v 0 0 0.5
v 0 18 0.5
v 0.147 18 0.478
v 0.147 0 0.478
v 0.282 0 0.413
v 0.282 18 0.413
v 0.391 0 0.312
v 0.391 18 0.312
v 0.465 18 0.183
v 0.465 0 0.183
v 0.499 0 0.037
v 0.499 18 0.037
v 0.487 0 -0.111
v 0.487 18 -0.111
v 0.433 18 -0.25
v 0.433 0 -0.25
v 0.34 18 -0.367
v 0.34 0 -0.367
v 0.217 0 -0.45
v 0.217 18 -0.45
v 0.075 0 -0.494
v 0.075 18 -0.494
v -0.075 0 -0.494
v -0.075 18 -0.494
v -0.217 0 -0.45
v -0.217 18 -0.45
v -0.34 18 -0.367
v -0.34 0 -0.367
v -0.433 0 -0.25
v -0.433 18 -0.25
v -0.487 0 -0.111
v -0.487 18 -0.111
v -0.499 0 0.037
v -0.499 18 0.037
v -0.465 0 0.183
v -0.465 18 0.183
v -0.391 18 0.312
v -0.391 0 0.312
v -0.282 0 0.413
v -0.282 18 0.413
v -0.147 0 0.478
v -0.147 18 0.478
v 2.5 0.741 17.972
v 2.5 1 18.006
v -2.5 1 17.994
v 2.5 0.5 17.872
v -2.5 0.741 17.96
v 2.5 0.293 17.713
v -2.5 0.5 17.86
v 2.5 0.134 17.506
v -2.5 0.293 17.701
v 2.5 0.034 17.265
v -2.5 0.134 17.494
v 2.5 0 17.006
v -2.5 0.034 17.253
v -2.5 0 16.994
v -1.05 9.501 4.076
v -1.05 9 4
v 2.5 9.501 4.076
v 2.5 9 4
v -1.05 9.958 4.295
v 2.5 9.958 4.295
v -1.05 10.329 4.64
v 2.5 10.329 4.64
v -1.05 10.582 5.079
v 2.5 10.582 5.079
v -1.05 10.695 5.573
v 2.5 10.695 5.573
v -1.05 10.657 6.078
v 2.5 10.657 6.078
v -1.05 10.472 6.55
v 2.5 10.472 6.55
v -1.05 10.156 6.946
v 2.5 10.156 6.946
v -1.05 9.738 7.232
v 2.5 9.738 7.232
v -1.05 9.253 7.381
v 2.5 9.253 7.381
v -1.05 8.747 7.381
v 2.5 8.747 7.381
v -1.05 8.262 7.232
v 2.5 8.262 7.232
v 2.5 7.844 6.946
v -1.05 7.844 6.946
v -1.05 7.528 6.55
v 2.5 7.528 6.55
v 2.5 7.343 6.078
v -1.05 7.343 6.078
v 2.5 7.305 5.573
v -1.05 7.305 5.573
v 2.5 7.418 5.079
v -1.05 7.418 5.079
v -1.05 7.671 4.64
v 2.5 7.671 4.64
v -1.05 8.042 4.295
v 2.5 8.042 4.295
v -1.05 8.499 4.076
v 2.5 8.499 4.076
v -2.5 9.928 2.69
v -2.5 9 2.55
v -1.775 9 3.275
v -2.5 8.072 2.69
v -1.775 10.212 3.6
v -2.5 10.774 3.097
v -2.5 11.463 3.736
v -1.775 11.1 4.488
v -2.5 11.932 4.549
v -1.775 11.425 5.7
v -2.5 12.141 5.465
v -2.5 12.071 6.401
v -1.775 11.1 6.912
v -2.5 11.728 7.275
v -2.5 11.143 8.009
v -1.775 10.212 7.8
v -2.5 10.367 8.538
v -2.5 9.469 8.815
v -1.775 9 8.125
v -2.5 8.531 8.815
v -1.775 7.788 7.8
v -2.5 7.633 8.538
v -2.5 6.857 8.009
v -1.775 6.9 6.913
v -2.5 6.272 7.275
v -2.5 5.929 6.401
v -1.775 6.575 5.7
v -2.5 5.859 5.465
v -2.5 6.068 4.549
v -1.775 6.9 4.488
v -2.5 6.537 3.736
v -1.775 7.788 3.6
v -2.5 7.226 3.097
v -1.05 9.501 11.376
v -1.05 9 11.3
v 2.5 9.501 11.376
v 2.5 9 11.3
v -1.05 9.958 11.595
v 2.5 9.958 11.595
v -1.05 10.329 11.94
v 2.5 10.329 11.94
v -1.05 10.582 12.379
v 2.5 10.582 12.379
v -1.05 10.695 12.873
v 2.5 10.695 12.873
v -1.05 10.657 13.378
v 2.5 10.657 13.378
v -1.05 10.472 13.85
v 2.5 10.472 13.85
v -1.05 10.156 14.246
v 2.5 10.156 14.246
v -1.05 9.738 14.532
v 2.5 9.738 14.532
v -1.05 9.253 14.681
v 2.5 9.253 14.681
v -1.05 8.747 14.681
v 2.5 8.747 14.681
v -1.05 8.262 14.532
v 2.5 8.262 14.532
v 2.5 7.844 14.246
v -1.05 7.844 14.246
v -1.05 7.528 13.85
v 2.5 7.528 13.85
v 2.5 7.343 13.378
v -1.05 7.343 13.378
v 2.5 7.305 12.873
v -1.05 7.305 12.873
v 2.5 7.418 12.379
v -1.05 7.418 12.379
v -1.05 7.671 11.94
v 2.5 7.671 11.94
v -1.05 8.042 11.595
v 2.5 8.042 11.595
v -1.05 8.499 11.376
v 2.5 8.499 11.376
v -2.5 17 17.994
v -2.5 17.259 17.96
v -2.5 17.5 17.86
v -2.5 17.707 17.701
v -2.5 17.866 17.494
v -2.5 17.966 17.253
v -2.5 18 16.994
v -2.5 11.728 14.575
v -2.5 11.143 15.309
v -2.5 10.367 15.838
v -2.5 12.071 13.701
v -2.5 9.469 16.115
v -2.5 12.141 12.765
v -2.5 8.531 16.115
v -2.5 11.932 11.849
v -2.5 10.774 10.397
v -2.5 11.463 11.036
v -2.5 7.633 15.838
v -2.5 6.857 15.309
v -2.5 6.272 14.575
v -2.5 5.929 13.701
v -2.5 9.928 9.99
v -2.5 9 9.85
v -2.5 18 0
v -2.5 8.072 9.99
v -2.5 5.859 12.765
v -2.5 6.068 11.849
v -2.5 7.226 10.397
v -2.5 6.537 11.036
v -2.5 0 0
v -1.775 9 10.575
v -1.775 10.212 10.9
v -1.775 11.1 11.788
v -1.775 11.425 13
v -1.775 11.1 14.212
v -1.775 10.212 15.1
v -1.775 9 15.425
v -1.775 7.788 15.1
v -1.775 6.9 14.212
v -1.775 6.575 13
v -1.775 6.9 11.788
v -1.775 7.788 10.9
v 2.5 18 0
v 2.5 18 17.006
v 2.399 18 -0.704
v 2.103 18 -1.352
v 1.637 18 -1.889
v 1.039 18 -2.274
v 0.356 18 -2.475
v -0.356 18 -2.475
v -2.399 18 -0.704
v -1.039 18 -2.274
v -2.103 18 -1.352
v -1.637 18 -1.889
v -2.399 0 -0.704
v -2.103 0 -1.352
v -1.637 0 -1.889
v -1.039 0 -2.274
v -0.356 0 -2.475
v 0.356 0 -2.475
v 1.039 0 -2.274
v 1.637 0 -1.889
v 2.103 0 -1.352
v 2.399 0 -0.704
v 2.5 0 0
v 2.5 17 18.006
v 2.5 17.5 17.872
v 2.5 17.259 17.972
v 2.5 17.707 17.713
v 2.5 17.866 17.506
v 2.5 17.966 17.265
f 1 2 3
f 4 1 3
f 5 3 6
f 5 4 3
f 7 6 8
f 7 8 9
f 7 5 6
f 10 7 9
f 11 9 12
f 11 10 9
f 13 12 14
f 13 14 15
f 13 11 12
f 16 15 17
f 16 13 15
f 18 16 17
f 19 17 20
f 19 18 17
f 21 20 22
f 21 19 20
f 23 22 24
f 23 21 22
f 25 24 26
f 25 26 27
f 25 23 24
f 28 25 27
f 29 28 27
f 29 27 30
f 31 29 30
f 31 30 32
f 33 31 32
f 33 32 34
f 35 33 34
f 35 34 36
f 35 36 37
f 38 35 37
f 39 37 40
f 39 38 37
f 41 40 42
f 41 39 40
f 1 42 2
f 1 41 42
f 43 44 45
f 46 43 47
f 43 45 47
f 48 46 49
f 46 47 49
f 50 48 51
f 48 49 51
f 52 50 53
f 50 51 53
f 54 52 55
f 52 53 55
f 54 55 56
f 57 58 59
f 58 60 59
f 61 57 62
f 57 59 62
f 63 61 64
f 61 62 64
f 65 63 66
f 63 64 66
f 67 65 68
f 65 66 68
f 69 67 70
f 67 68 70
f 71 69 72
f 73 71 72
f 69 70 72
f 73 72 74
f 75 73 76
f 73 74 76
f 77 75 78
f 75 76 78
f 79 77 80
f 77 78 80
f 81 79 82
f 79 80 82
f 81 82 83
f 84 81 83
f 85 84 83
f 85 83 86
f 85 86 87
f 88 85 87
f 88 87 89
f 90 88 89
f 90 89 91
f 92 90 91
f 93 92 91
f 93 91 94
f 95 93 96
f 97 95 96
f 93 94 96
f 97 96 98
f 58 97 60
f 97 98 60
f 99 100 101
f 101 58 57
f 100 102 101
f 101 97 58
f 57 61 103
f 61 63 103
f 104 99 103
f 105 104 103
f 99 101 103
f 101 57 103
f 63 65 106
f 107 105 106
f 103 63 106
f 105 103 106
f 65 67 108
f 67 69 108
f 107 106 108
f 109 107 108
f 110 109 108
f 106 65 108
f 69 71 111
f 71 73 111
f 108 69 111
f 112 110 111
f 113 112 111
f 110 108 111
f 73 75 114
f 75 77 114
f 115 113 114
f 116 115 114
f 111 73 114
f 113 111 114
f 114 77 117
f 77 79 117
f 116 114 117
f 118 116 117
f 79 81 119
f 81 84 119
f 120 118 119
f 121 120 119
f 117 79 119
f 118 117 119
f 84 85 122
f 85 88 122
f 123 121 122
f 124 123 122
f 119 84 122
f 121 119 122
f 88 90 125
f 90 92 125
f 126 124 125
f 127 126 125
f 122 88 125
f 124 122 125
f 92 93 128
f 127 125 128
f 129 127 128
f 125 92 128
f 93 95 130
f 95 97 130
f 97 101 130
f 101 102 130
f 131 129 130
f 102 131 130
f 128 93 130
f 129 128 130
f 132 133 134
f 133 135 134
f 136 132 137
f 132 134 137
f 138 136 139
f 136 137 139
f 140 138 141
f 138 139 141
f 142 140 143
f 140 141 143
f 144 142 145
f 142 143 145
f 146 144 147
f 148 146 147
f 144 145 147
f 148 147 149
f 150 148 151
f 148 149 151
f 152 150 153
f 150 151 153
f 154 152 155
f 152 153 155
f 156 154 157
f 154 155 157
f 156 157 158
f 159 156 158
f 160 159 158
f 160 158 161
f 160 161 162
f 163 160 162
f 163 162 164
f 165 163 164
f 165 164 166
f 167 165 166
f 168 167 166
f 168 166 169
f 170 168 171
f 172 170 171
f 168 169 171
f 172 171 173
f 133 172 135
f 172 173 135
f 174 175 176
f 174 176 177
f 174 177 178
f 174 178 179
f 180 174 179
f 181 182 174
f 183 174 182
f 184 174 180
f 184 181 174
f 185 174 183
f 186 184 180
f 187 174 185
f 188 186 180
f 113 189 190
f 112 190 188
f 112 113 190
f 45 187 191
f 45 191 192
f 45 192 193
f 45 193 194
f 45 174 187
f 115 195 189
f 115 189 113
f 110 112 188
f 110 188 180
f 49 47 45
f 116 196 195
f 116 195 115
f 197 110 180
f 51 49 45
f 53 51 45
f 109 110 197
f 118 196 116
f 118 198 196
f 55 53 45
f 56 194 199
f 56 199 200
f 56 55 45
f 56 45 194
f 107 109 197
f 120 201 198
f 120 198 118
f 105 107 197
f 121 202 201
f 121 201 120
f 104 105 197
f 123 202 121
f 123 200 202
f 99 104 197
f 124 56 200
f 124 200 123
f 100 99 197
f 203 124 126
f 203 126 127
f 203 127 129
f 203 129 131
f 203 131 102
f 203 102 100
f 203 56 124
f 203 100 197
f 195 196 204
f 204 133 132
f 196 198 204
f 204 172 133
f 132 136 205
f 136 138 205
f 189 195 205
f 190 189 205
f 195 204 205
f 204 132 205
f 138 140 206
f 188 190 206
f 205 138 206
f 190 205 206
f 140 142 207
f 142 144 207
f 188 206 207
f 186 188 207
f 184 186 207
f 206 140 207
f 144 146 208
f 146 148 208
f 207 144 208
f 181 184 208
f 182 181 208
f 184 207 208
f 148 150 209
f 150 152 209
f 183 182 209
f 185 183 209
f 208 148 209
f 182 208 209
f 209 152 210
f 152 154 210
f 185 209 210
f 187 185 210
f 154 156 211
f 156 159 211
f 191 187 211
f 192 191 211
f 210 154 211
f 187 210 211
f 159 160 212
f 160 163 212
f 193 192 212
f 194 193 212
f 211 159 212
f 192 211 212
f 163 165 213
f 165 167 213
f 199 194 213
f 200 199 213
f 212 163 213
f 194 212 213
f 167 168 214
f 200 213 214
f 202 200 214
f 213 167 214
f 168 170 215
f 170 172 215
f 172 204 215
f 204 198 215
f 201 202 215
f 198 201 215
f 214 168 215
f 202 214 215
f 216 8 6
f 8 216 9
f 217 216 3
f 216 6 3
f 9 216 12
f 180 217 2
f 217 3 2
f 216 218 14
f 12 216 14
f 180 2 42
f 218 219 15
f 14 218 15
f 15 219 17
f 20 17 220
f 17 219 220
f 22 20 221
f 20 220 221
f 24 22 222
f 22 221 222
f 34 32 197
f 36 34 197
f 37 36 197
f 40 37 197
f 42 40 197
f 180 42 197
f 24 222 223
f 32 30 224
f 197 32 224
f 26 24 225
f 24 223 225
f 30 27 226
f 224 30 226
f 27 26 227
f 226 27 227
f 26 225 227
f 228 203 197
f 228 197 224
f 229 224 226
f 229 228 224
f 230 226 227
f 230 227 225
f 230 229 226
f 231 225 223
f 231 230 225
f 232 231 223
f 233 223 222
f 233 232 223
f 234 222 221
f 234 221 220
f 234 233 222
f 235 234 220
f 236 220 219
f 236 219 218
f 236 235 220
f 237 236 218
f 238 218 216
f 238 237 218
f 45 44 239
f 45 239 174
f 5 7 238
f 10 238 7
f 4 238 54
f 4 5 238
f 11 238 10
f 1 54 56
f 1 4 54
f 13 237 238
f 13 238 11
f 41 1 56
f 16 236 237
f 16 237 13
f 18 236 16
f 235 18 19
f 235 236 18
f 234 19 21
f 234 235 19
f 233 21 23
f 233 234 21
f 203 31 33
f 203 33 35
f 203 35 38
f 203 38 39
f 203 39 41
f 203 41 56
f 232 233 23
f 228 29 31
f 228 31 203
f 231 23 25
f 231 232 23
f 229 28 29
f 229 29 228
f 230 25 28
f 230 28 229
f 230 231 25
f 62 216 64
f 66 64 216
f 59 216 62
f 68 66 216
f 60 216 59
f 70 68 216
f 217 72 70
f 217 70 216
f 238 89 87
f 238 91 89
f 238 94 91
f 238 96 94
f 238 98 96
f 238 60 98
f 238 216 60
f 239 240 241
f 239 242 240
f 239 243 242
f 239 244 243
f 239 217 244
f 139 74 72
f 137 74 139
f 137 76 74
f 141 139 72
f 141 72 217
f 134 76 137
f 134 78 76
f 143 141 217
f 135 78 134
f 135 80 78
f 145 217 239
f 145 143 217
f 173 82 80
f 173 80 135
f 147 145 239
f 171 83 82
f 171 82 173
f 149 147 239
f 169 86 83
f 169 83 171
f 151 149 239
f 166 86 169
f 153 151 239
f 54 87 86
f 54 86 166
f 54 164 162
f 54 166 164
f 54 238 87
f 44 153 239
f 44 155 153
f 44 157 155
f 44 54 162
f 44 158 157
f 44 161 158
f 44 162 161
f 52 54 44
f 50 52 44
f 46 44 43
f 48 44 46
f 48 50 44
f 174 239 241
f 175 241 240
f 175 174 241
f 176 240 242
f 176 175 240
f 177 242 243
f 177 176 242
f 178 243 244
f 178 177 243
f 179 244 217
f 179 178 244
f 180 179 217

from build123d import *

# Parameters (mm, degrees)
SKETCH1_R                                       = 0.5
BOSS_EXTRUDE1_DEPTH                             = 18
FILLET2_R                                       = 1
CSK_FOR_M3_FLAT_HEAD_MACHINE_SCREW2_D           = 3.4
CSK_FOR_M3_FLAT_HEAD_MACHINE_SCREW2_CSINK_D     = 6.3
CSK_FOR_M3_FLAT_HEAD_MACHINE_SCREW2_CSINK_ANGLE = 90


with BuildPart() as part:
    # Sketch1 → Boss-Extrude1 (new body)
    with BuildSketch(Plane(origin=(0, 0, 0), x_dir=(1, 0, 0), z_dir=(0, 1, 0))):
        with BuildLine():
            Line((-2.5, -17.994062369), (-2.5, 0))
            ThreePointArc((-2.5, 0), (0, 2.5), (2.5, 0))
            Line((2.5, 0), (2.5, -18.006040941))
            Line((2.5, -18.006040941), (-2.5, -17.994062369))
        make_face()
        with Locations(Location((0, 0, 0), (0, 0, 270))):
            Circle(SKETCH1_R, mode=Mode.SUBTRACT)
    extrude(amount=BOSS_EXTRUDE1_DEPTH)

    # Fillet2
    fillet2_edges = [part.edges().sort_by_distance(p)[0] for p in [
        (0, 18, 18.000051655),
        (0, 0, 18.000051655),
    ]]
    fillet(fillet2_edges, radius=FILLET2_R)

    # CSK for M3 Flat Head Machine Screw2 (through all)
    with Locations(Plane.ZY.offset(2.5)):
        with Locations((5.7, 9), (13, 9)):
            CounterSinkHole(CSK_FOR_M3_FLAT_HEAD_MACHINE_SCREW2_D / 2, CSK_FOR_M3_FLAT_HEAD_MACHINE_SCREW2_CSINK_D / 2, counter_sink_angle=CSK_FOR_M3_FLAT_HEAD_MACHINE_SCREW2_CSINK_ANGLE)


solid = part.part
